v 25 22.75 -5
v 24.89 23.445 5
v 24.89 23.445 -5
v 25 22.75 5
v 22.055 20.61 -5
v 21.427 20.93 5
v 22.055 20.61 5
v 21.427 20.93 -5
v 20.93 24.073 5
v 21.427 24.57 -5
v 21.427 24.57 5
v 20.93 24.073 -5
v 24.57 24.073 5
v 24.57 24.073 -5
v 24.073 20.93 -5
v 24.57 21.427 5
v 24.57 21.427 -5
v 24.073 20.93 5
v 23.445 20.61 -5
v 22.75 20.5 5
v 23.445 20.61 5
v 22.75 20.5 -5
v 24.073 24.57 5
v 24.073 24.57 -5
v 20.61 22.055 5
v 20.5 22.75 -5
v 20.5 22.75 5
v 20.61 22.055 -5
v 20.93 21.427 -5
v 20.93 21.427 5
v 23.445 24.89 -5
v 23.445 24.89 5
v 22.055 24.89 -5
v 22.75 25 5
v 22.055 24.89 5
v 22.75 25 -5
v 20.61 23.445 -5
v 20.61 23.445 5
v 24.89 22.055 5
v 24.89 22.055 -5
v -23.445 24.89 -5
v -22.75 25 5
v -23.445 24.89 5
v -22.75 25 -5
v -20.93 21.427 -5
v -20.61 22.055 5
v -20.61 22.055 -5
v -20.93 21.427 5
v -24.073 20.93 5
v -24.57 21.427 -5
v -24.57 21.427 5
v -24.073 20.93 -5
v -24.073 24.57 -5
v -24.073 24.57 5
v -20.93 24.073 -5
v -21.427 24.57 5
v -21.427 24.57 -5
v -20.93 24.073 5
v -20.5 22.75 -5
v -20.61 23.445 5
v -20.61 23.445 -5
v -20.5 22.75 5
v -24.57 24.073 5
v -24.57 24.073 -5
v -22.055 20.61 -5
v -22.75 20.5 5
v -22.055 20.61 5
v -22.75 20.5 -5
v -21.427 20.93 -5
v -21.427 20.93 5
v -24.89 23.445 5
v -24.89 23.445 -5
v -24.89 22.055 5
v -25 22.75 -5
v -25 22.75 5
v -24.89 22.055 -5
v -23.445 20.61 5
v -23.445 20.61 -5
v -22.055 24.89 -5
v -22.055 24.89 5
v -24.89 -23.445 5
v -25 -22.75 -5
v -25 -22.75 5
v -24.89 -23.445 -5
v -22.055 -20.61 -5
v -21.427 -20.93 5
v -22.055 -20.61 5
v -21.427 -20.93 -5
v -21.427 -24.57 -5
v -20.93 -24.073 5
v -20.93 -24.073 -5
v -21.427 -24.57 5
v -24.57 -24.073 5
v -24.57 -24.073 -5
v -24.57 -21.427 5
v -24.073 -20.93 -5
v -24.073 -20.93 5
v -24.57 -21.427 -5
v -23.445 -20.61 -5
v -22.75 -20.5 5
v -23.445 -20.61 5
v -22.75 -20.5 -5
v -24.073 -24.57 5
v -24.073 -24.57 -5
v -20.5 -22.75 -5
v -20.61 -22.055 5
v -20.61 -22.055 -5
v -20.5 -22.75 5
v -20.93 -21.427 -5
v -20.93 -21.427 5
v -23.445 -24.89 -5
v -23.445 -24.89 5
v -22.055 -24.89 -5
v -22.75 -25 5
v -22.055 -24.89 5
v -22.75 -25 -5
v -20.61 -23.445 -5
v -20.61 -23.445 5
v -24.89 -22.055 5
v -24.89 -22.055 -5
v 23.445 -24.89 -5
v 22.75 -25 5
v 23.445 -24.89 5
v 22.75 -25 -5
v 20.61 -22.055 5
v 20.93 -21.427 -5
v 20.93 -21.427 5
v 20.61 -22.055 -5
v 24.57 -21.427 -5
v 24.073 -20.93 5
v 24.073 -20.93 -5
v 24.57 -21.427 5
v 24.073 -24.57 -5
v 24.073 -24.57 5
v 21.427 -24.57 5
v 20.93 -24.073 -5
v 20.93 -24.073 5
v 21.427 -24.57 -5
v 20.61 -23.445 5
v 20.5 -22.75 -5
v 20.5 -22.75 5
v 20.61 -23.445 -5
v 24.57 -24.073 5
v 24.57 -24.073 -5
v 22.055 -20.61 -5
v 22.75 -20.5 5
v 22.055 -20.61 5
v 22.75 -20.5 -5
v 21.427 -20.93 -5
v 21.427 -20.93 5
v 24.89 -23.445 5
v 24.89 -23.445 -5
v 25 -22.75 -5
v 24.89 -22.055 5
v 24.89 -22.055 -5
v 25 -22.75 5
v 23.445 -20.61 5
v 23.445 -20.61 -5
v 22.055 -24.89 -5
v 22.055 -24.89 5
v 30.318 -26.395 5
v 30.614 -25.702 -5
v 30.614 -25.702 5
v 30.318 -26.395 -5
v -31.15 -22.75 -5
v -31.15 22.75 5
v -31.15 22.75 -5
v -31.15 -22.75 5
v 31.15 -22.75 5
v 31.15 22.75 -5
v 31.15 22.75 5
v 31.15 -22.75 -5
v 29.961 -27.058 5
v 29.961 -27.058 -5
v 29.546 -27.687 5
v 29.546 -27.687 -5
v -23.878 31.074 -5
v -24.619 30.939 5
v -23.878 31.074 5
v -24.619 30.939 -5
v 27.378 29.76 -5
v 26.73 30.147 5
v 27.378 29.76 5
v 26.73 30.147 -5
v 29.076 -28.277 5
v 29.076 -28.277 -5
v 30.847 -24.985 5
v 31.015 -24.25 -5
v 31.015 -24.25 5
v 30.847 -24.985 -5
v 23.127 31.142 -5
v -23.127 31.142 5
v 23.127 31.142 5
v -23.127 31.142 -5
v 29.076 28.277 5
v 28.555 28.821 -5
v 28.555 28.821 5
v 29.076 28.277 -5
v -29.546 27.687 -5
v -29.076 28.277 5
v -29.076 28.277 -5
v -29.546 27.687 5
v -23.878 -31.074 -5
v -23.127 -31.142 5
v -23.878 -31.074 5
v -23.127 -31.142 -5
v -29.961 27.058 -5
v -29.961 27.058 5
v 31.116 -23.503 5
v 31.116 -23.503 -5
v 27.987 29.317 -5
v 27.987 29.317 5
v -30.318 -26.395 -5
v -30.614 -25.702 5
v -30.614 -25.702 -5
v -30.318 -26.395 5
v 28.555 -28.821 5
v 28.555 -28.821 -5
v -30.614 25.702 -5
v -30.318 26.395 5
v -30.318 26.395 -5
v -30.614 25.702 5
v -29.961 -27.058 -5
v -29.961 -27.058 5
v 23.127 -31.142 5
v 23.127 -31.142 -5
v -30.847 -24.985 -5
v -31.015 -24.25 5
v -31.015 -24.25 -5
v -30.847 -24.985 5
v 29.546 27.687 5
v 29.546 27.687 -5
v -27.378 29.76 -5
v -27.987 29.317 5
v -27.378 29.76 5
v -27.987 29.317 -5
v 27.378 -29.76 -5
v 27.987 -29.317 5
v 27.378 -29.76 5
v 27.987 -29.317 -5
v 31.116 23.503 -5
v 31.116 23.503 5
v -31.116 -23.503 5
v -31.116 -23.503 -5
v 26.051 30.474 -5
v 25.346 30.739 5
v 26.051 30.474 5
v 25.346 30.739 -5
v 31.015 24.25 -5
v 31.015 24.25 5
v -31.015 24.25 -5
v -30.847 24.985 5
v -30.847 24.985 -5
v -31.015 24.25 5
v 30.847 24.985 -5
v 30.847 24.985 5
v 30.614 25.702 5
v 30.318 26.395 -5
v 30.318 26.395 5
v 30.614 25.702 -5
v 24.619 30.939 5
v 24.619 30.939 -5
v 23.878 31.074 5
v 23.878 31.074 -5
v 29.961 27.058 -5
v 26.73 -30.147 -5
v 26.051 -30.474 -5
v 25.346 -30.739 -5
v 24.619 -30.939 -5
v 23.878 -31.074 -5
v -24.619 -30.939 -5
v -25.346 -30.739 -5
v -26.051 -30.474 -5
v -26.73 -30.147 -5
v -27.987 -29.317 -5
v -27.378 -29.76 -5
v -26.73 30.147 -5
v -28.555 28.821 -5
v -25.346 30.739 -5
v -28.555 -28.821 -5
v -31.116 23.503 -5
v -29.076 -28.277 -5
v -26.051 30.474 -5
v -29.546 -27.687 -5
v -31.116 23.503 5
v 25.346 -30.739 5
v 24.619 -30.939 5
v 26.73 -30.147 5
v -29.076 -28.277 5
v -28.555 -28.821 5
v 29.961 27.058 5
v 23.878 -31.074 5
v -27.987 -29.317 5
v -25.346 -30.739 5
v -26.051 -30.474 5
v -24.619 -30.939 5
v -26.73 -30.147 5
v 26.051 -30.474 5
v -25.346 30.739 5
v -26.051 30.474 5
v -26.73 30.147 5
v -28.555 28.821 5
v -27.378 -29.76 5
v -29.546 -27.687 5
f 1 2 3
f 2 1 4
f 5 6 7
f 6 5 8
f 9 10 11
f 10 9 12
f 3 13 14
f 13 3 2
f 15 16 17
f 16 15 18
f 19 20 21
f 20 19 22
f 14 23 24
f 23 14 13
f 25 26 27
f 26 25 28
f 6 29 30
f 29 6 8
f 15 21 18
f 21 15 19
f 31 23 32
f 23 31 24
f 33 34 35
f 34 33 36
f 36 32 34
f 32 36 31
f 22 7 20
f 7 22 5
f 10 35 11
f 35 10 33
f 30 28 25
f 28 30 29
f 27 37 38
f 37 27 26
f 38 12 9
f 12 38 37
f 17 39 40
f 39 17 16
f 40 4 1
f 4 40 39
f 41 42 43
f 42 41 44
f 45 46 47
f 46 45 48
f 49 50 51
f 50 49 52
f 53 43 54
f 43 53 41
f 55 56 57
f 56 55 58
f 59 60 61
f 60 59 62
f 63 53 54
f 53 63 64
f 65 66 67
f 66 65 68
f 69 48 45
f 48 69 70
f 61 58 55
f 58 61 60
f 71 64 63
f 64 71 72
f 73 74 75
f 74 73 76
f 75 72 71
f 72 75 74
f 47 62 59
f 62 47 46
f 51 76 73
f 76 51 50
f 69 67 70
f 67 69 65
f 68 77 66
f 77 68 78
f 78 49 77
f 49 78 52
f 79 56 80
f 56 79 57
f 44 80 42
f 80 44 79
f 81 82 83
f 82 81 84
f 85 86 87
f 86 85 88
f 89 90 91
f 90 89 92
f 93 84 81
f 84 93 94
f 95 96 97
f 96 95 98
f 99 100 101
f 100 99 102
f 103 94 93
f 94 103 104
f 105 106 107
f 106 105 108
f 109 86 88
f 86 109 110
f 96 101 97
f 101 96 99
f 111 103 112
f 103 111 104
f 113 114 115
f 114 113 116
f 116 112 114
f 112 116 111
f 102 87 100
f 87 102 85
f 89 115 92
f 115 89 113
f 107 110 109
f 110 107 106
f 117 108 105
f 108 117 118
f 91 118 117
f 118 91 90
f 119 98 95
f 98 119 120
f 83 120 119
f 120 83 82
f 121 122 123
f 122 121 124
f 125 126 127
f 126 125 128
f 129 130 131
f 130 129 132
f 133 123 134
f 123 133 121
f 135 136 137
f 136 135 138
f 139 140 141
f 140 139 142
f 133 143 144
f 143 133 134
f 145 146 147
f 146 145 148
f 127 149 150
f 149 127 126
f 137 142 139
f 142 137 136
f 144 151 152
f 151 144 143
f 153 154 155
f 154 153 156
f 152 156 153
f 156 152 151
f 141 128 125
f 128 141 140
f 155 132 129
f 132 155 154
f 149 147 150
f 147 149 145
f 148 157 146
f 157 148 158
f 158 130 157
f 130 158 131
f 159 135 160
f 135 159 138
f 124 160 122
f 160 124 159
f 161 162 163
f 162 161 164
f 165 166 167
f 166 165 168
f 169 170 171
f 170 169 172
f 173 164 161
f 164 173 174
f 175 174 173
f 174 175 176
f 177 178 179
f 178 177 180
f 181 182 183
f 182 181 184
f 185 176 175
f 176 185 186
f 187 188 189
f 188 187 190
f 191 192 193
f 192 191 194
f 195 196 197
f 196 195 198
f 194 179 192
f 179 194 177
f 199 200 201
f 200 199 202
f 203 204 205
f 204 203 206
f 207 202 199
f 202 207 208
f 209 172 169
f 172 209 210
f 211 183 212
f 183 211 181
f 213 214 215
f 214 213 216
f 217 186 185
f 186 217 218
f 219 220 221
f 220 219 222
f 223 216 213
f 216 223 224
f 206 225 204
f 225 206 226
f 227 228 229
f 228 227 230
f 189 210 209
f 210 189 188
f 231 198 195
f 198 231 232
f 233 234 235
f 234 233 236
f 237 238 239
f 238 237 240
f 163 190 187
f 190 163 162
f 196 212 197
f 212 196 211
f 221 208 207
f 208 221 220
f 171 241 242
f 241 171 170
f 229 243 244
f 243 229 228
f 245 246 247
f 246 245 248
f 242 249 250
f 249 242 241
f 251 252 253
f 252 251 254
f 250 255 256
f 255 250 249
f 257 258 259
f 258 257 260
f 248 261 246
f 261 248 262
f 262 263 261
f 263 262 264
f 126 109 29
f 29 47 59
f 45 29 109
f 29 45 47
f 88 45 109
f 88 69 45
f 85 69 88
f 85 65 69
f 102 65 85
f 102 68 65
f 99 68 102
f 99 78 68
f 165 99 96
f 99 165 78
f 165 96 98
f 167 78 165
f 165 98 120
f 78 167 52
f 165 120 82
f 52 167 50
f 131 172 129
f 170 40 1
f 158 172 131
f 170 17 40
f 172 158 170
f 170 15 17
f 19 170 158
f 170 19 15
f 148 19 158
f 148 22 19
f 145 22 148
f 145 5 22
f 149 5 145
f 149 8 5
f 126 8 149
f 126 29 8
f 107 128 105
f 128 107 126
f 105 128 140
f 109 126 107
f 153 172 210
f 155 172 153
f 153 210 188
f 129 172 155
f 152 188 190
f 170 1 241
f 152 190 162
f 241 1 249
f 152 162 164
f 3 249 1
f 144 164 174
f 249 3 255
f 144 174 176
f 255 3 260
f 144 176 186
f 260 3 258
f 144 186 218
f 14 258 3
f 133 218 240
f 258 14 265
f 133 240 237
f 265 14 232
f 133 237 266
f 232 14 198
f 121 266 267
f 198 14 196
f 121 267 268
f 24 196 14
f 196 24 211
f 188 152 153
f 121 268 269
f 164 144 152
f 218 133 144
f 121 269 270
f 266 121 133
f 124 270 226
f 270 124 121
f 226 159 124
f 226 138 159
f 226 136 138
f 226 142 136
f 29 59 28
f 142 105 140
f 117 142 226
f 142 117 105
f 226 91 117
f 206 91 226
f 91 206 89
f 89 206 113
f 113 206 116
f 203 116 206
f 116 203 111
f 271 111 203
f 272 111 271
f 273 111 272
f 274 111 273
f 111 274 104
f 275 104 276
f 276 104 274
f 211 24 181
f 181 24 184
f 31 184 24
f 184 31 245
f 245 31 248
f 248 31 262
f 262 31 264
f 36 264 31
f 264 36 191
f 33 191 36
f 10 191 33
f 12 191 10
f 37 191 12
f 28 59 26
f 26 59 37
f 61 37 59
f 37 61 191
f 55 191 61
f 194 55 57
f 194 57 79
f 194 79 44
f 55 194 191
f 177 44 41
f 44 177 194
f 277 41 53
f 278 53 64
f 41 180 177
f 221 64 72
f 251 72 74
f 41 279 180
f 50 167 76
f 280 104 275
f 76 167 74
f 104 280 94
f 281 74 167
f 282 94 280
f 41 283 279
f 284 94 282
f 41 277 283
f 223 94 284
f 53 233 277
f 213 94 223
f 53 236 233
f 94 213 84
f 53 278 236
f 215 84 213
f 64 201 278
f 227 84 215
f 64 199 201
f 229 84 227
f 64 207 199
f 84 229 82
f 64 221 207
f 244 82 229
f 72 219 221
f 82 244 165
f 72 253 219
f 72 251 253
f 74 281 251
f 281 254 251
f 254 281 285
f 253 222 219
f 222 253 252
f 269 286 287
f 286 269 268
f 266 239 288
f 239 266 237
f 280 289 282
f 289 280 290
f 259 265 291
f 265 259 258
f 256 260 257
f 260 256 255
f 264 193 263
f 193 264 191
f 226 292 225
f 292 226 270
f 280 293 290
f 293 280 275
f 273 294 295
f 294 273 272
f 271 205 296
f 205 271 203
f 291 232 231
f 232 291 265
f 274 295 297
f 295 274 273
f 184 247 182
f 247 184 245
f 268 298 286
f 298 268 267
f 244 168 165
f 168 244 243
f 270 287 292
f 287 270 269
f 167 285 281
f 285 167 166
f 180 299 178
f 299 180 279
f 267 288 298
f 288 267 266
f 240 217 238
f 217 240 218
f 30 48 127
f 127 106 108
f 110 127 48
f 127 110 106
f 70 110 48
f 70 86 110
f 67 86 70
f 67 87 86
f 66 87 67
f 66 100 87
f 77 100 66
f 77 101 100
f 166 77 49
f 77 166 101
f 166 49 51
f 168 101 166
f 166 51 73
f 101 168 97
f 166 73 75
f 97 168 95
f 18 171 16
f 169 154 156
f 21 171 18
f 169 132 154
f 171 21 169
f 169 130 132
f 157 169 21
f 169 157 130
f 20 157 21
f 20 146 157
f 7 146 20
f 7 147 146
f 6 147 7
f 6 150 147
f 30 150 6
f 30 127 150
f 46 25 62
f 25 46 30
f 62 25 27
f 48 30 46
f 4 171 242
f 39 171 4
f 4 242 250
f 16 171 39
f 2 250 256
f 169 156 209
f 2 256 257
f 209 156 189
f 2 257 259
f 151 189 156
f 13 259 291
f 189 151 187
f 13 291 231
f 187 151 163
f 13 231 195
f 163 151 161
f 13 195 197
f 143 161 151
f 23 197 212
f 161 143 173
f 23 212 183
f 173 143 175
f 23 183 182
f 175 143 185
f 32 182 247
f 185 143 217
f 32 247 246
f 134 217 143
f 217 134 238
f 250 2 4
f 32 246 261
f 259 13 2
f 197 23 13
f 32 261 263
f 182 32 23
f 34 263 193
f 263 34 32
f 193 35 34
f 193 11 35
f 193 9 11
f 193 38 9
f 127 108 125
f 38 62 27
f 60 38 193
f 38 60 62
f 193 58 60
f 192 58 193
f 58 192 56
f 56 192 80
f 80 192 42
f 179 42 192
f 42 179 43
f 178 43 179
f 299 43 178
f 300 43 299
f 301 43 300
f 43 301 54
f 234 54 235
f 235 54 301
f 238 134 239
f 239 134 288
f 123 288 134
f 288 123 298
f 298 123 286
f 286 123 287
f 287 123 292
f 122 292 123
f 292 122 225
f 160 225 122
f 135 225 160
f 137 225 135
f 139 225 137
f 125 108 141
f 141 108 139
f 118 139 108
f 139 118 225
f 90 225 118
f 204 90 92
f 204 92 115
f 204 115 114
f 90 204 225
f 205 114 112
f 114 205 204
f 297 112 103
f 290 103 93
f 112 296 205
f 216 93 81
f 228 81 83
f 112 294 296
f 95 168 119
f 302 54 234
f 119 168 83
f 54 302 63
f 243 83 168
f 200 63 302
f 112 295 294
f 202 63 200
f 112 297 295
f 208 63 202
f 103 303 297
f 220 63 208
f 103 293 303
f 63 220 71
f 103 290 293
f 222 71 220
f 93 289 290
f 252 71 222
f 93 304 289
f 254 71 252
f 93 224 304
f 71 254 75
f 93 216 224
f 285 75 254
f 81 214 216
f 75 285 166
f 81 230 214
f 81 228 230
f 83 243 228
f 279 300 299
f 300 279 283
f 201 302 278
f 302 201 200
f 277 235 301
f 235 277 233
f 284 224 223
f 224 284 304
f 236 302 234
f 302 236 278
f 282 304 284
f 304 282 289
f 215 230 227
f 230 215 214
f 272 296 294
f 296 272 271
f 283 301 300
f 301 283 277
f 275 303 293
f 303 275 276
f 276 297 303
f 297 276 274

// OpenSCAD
// file: ../../parameters.scad
maximum_printable_size = 150;

layer_thickness = 0.2;
base_patern = 10;
global_clearance = 0.2;
clearance = global_clearance;


//Screw diameter and nut for M10 [mm]
M10_screw_diameter = 10.4;
M10_head_height = 10;
M10_head_diameter = 16+0.5;
M10_nut_height = 10.5;
M10_nut_diameter = 25.5;
M10_nut_pocket = 22.3;

//Screw diameter for M8 [mm]
M8_screw_diameter = 8.6;
M8_head_height = 8;
M8_head_diameter = 13.5;
M8_nut_height = 7.5;
M8_square_nut_thin_height = 4.5;
M8_nut_diameter = 14.4 + 0.5;
M8_nut_pocket = 13 + 0.5;
M8_washer_diameter = 16;
M8_washer_thickness = 1.5;


//Screw diameter and nut for M6 [mm]
M6_screw_diameter=6.5;
M6_head_diameter = 10+0.5;
M6_head_height = 6;
M6_nut_height = 4.9;
M6_nut_diameter = 11.8;
M6_nut_pocket = 10.4;
M6_square_nut_height = 3;
M6_square_nut_diameter = 10;
M6_washer_thickness = 1.6;

//Screw diameter and nut for M5 [mm]
M5_screw_diameter=5.5;
M5_head_height = 5;
M5_head_diameter = 13+0.5;
M5_nut_height = 4.5;
M5_nut_diameter = 9.4;
M5_nut_pocket = 8.4;

//Screw diameter and nut for M4 [mm]
M4_screw_diameter=4.5;
M4_screw_head_height = 4;
M4_nut_height = 3.2;
M4_nut_diameter = 8.4;
M4_nut_pocket = 7.5;

//Screw diameter and nut for M3 [mm]
M3_screw_diameter = 3.2;
M3_nut_height = 2.7;
M3_nut_diameter = 6.6;
M3_nut_pocket = 5.6;
M3_screw_head_height = 3;

//Screw diameter and nut for M2,5 [mm]
M2_5_screw_diameter = 2.7;
M2_5_nut_height = 2.3;
M2_5_nut_diameter = 6;
M2_5_nut_pocket = 5.5;

// kulove lozisko

bearing_efsm_08_h = 33+1;
bearing_efsm_08_m = 22;
bearing_efsm_08_db = 18;
bearing_efsm_08_ag = 10.5;
bearing_efsm_08_n = M4_screw_diameter;
bearing_efsm_08_a1 = 5.5;
bearing_efsm_08_d = 8.25;
bearing_efsm_08_B = 8; // ball height

bearing_efsm_10_h = 38+1;
bearing_efsm_10_m = 26;
bearing_efsm_10_db = 21.9;
bearing_efsm_10_ag = 12+0.2;
bearing_efsm_10_n = M5_screw_diameter;
bearing_efsm_10_a1 = 6.5;
bearing_efsm_10_d = 10.25;


bearing_efsm_12_width = 40+1;
bearing_efsm_12_h = bearing_efsm_12_width;
bearing_efsm_12_boltd = 28/2; // polovina vzdalenosti mezi srouby
bearing_efsm_12_m = bearing_efsm_12_boltd*2;
bearing_efsm_12_db = 25;
bearing_efsm_12_ag = 13;
bearing_efsm_12_a1 = 7;
bearing_efsm_12_n = M5_screw_diameter;
bearing_efsm_12_d = 12.15;
bearing_efsm_12_B = 10; // ball height
bearing_efsm_space = 1;

bearing_efsm_17_width = 54+1;
bearing_efsm_17_h = bearing_efsm_17_width;
bearing_efsm_17_boltd = 38/2; // polovina vzdalenosti mezi srouby
bearing_efsm_17_m = bearing_efsm_17_boltd*2;
bearing_efsm_17_db = 35;
bearing_efsm_17_ag = 18;
bearing_efsm_17_n = M6_screw_diameter;
bearing_efsm_17_a1 = 10;
bearing_efsm_17_B = 17; // ball height

//limcove lozisko
bearing_EFOM_10_L=26; //celkova sirka zakladny
bearing_EFOM_10_d1=10.3;//diametr otvoru real=10 mm
bearing_EFOM_10_dB=22;//diametr vystupku pro ulozeni lozika
bearing_EFOM_10_H=52;//celková delka zakladny
bearing_EFOM_10_J=36;// hole pitch
bearing_EFOM_10_A1=6.5;//vyska pouzdra
bearing_EFOM_10_Ag=12;//celkova vyska
bearing_EFOM_10_N1=5;//sirka otvoru pro sroub
bearing_EFOM_10_N2=8;//delka otvoru pro sroub
bearing_EFOM_10_m=36;//roztec der pro sroub
bearing_EFOM_10_h=9;//vyska lozika


608_bearing_outer_diameter = 22.3;
608_bearing_inner_diameter = 16;
608_bearing_thickness = 7.1;


// 20 KG servo parameters

servo_20kg_axis_offset = 9.375; // jak je osa mimo stredu
servo_20kg_body_x = 42;
servo_20kg_body_y = 21;
servo_20kg_body_z = 40;
servo_20kg_thread_x = 49/2;
servo_20kg_thread_y = 10/2;
servo_20kg_body_below = 10; // jak hluboko je tělo serva pod drzaky na srouby
servo_20kg_below = 25.8; // jak hluboko je páka serva pod drzaky na srouby

servo_20kg_bolt_d = 2.5+0.3;
servo_20kg_nut_d = 5+0.3;


//strain gauge
strain_gauge_width = 12.7;
strain_gauge_length = 75.1;
strain_gauge_screw_distance = 10;

//ALU profile
ALU_profile_width = 30.5;
ALU_profile_holder_wall_thickness = 3;
ALU_profile_groove_width = 8;

//pillow block bearing
//https://www.igus.eu/product/372
//Part no. KSTM-08
KSTM08_screws_distance = 33;         //m
KSTM08_screws_holes_diameter = 4.5;  //d2
KSTM08_flange_thickness = 6;         //h3
KSTM08_case_width = 9;               //C1
KSTM08_case_length = 47;             //a
KSTM08_ball_width = 12;              //B
KSTM08_ball_hole_diameter = 7.85;    //d1


//ložiska pro malý rotor
bearing_outer_diameter = 10.2;    // Rozměr B1 v nákresu s přídavkem na toleranci otvoru
bearing_thickness = 4;        // Rozměr B2 v nákresu
//bearing_shaft_length = 19.5;    // Rozměr B3 v nákresu, Originalni hodnota 19.5
bearing_shaft_length = 20;    // Rozměr B3 v nákresu


//parametry víčka s telemetrickou anténou
S01_sila_materialu=1.2;
S01_vyska_horni_zavit=10;
S01_hloubka_zavitu=4;
S01_prumer_vnitrni=50;
LO_spodni_prumer=17.2;
LO_vyska_bez_krytu=15;
S01_tolerance_zavit=1.5;
R01_vyska_prekryti_statoru=10;

g3_0_cone1 = 70;
g3_0_srcew_dist = 55;



// scale parameters
base_length = 500;
base_width = 500;
front_tower_offset = 220;
back_tower_offset = 0;
tower_height = 375;
tower_angle = atan((base_width/2-ALU_profile_width-10)/tower_height);
tower_arm_length = tower_height/cos(tower_angle);
tower_drag_z_offset = 22;
electro_box_length = 225;
electro_box_width = 165;
electro_box_height = 51.5;

// calibration device parameters
calibration_arm_x_offset = 140;
calibration_arm_y_offset = 50;





// Engine and engine holder parameters

motor_holder_height = base_patern * 5;
motor_holder_thickness = 5;
motor_holder_motor_height = 25;
motor_holder_side_mount_height = base_patern*2.5;
pylon_holder_side_mount_height = base_patern*4.5;

engine_angle = -5; // ongle of engine axis relative to fuselage main axis
engine_diameter = 55;
engine_offset = 53;			// Posun motoru v ose X (dopredu)




// Parametry pro hacek na kabely od motoru
	motor_wire_holder_width = 5;
	motor_wire_holder_height = 10;
	motor_wire_holder_space = 3;
	motor_wire_holder_thickness = 2.5;
	motor_wire_holder_z_shift = 10;
	motor_wire_holder_x_shift = 19;

// Parametry pro ochranny ram nad motorem 
	motor_protective_frame_x_shift = 20;
	motor_protective_frame_z_base = 32;
	motor_protective_frame_beam_width = 5;
	motor_protective_frame_beam_thickness = 3;
	motor_protective_frame_width = base_width-3;
	motor_protective_frame_plug_thickness = 2;
	motor_protective_frame_plug_length = 4;
	motor_protective_frame_thickness = 5;
	motor_protective_frame_z_scale = 0.75;
// main file
/*
pro díl do kterého se zastrkávají matky z boku
    rotor_joint(1);

pro díl který obsahuje jen díry na šrouby M4
    rotor_joint(2);

pro díl co má díry na matky ze shora
    rotor_joint(3);
*/


include <../../parameters.scad>

module screw_nut_hole(thickness=20) {
    difference() {
        translate([(ALU_profile_width/2+ALU_profile_holder_wall_thickness+M4_screw_diameter), (ALU_profile_width/2+ALU_profile_holder_wall_thickness+M4_screw_diameter), 0])
            cylinder(d=M4_screw_diameter, h=thickness+0.1, center=true, $fn=20);
        translate([(ALU_profile_width/2+ALU_profile_holder_wall_thickness+M4_screw_diameter), (ALU_profile_width/2+ALU_profile_holder_wall_thickness+M4_screw_diameter), thickness/2+.01])
            cylinder(d=M4_screw_diameter, h=1, $fn=20); 
    }

    hull() {
        translate([(ALU_profile_width/2+ALU_profile_holder_wall_thickness+M4_screw_diameter), (ALU_profile_width/2+ALU_profile_holder_wall_thickness+M4_screw_diameter), 0])
            rotate([0, 0, 30])
                cylinder(d=M4_nut_diameter, h=M4_nut_height, $fn=6, center=true);

        translate([(ALU_profile_width/2+ALU_profile_holder_wall_thickness+M4_screw_diameter), (ALU_profile_width/2+ALU_profile_holder_wall_thickness+M4_screw_diameter)+M4_screw_diameter*2, 0])
            cube([M4_nut_pocket, M4_screw_diameter, M4_nut_height], center=true);
    }
}

module rotor_joint(mode, thickness=10) {
    difference() {
        rotor_joint_plate(thickness=thickness);

        rotor_joint_holes(mode=mode, thickness=thickness);
    }
}

module rotor_joint_plate(thickness=10) {
    minkowski() {
            cube([ALU_profile_width+ALU_profile_holder_wall_thickness*2+M4_screw_diameter*2, ALU_profile_width+ALU_profile_holder_wall_thickness*2+M4_screw_diameter*2, thickness/2], center=true);
            cylinder(d=M4_nut_diameter*2, h=thickness/2, $fn=70, center=true);
    }
}

module rotor_joint_holes(mode, thickness=10, hole_head_height=30) {
    if(mode == 1) {
        for(i = [0:90:360]) {
            rotate([0, 0, i])
                screw_nut_hole();
        }
    }
    else if(mode == 2) {
        for(i = [0:90:360])
        rotate([0, 0, i])
        translate([(ALU_profile_width/2+ALU_profile_holder_wall_thickness+M4_screw_diameter), (ALU_profile_width/2+ALU_profile_holder_wall_thickness+M4_screw_diameter), 0]) {
            union() {
                cylinder(d=M4_screw_diameter, h=thickness+0.1, $fn=20, center=true);
                
                translate([0, 0, thickness*2+.01+(hole_head_height-30)/2])
                cylinder(d=M4_nut_diameter*2+1, h=hole_head_height, $fn=100, center=true);
            }
        }
    }
    else if(mode == 3) {
        for(i = [0:90:360]) {
            rotate([0, 0, i])
            translate([(ALU_profile_width/2+ALU_profile_holder_wall_thickness+M4_screw_diameter), (ALU_profile_width/2+ALU_profile_holder_wall_thickness+M4_screw_diameter), 0]) {
                cylinder(d=M4_screw_diameter, h=thickness, $fn=20, center=true);
                translate([0, 0, thickness/2-M4_nut_height+0.1])
                cylinder(d=M4_nut_diameter, h=M4_nut_height+0.1, $fn=6);
            }
        }
    }
}

rotor_joint(2);
